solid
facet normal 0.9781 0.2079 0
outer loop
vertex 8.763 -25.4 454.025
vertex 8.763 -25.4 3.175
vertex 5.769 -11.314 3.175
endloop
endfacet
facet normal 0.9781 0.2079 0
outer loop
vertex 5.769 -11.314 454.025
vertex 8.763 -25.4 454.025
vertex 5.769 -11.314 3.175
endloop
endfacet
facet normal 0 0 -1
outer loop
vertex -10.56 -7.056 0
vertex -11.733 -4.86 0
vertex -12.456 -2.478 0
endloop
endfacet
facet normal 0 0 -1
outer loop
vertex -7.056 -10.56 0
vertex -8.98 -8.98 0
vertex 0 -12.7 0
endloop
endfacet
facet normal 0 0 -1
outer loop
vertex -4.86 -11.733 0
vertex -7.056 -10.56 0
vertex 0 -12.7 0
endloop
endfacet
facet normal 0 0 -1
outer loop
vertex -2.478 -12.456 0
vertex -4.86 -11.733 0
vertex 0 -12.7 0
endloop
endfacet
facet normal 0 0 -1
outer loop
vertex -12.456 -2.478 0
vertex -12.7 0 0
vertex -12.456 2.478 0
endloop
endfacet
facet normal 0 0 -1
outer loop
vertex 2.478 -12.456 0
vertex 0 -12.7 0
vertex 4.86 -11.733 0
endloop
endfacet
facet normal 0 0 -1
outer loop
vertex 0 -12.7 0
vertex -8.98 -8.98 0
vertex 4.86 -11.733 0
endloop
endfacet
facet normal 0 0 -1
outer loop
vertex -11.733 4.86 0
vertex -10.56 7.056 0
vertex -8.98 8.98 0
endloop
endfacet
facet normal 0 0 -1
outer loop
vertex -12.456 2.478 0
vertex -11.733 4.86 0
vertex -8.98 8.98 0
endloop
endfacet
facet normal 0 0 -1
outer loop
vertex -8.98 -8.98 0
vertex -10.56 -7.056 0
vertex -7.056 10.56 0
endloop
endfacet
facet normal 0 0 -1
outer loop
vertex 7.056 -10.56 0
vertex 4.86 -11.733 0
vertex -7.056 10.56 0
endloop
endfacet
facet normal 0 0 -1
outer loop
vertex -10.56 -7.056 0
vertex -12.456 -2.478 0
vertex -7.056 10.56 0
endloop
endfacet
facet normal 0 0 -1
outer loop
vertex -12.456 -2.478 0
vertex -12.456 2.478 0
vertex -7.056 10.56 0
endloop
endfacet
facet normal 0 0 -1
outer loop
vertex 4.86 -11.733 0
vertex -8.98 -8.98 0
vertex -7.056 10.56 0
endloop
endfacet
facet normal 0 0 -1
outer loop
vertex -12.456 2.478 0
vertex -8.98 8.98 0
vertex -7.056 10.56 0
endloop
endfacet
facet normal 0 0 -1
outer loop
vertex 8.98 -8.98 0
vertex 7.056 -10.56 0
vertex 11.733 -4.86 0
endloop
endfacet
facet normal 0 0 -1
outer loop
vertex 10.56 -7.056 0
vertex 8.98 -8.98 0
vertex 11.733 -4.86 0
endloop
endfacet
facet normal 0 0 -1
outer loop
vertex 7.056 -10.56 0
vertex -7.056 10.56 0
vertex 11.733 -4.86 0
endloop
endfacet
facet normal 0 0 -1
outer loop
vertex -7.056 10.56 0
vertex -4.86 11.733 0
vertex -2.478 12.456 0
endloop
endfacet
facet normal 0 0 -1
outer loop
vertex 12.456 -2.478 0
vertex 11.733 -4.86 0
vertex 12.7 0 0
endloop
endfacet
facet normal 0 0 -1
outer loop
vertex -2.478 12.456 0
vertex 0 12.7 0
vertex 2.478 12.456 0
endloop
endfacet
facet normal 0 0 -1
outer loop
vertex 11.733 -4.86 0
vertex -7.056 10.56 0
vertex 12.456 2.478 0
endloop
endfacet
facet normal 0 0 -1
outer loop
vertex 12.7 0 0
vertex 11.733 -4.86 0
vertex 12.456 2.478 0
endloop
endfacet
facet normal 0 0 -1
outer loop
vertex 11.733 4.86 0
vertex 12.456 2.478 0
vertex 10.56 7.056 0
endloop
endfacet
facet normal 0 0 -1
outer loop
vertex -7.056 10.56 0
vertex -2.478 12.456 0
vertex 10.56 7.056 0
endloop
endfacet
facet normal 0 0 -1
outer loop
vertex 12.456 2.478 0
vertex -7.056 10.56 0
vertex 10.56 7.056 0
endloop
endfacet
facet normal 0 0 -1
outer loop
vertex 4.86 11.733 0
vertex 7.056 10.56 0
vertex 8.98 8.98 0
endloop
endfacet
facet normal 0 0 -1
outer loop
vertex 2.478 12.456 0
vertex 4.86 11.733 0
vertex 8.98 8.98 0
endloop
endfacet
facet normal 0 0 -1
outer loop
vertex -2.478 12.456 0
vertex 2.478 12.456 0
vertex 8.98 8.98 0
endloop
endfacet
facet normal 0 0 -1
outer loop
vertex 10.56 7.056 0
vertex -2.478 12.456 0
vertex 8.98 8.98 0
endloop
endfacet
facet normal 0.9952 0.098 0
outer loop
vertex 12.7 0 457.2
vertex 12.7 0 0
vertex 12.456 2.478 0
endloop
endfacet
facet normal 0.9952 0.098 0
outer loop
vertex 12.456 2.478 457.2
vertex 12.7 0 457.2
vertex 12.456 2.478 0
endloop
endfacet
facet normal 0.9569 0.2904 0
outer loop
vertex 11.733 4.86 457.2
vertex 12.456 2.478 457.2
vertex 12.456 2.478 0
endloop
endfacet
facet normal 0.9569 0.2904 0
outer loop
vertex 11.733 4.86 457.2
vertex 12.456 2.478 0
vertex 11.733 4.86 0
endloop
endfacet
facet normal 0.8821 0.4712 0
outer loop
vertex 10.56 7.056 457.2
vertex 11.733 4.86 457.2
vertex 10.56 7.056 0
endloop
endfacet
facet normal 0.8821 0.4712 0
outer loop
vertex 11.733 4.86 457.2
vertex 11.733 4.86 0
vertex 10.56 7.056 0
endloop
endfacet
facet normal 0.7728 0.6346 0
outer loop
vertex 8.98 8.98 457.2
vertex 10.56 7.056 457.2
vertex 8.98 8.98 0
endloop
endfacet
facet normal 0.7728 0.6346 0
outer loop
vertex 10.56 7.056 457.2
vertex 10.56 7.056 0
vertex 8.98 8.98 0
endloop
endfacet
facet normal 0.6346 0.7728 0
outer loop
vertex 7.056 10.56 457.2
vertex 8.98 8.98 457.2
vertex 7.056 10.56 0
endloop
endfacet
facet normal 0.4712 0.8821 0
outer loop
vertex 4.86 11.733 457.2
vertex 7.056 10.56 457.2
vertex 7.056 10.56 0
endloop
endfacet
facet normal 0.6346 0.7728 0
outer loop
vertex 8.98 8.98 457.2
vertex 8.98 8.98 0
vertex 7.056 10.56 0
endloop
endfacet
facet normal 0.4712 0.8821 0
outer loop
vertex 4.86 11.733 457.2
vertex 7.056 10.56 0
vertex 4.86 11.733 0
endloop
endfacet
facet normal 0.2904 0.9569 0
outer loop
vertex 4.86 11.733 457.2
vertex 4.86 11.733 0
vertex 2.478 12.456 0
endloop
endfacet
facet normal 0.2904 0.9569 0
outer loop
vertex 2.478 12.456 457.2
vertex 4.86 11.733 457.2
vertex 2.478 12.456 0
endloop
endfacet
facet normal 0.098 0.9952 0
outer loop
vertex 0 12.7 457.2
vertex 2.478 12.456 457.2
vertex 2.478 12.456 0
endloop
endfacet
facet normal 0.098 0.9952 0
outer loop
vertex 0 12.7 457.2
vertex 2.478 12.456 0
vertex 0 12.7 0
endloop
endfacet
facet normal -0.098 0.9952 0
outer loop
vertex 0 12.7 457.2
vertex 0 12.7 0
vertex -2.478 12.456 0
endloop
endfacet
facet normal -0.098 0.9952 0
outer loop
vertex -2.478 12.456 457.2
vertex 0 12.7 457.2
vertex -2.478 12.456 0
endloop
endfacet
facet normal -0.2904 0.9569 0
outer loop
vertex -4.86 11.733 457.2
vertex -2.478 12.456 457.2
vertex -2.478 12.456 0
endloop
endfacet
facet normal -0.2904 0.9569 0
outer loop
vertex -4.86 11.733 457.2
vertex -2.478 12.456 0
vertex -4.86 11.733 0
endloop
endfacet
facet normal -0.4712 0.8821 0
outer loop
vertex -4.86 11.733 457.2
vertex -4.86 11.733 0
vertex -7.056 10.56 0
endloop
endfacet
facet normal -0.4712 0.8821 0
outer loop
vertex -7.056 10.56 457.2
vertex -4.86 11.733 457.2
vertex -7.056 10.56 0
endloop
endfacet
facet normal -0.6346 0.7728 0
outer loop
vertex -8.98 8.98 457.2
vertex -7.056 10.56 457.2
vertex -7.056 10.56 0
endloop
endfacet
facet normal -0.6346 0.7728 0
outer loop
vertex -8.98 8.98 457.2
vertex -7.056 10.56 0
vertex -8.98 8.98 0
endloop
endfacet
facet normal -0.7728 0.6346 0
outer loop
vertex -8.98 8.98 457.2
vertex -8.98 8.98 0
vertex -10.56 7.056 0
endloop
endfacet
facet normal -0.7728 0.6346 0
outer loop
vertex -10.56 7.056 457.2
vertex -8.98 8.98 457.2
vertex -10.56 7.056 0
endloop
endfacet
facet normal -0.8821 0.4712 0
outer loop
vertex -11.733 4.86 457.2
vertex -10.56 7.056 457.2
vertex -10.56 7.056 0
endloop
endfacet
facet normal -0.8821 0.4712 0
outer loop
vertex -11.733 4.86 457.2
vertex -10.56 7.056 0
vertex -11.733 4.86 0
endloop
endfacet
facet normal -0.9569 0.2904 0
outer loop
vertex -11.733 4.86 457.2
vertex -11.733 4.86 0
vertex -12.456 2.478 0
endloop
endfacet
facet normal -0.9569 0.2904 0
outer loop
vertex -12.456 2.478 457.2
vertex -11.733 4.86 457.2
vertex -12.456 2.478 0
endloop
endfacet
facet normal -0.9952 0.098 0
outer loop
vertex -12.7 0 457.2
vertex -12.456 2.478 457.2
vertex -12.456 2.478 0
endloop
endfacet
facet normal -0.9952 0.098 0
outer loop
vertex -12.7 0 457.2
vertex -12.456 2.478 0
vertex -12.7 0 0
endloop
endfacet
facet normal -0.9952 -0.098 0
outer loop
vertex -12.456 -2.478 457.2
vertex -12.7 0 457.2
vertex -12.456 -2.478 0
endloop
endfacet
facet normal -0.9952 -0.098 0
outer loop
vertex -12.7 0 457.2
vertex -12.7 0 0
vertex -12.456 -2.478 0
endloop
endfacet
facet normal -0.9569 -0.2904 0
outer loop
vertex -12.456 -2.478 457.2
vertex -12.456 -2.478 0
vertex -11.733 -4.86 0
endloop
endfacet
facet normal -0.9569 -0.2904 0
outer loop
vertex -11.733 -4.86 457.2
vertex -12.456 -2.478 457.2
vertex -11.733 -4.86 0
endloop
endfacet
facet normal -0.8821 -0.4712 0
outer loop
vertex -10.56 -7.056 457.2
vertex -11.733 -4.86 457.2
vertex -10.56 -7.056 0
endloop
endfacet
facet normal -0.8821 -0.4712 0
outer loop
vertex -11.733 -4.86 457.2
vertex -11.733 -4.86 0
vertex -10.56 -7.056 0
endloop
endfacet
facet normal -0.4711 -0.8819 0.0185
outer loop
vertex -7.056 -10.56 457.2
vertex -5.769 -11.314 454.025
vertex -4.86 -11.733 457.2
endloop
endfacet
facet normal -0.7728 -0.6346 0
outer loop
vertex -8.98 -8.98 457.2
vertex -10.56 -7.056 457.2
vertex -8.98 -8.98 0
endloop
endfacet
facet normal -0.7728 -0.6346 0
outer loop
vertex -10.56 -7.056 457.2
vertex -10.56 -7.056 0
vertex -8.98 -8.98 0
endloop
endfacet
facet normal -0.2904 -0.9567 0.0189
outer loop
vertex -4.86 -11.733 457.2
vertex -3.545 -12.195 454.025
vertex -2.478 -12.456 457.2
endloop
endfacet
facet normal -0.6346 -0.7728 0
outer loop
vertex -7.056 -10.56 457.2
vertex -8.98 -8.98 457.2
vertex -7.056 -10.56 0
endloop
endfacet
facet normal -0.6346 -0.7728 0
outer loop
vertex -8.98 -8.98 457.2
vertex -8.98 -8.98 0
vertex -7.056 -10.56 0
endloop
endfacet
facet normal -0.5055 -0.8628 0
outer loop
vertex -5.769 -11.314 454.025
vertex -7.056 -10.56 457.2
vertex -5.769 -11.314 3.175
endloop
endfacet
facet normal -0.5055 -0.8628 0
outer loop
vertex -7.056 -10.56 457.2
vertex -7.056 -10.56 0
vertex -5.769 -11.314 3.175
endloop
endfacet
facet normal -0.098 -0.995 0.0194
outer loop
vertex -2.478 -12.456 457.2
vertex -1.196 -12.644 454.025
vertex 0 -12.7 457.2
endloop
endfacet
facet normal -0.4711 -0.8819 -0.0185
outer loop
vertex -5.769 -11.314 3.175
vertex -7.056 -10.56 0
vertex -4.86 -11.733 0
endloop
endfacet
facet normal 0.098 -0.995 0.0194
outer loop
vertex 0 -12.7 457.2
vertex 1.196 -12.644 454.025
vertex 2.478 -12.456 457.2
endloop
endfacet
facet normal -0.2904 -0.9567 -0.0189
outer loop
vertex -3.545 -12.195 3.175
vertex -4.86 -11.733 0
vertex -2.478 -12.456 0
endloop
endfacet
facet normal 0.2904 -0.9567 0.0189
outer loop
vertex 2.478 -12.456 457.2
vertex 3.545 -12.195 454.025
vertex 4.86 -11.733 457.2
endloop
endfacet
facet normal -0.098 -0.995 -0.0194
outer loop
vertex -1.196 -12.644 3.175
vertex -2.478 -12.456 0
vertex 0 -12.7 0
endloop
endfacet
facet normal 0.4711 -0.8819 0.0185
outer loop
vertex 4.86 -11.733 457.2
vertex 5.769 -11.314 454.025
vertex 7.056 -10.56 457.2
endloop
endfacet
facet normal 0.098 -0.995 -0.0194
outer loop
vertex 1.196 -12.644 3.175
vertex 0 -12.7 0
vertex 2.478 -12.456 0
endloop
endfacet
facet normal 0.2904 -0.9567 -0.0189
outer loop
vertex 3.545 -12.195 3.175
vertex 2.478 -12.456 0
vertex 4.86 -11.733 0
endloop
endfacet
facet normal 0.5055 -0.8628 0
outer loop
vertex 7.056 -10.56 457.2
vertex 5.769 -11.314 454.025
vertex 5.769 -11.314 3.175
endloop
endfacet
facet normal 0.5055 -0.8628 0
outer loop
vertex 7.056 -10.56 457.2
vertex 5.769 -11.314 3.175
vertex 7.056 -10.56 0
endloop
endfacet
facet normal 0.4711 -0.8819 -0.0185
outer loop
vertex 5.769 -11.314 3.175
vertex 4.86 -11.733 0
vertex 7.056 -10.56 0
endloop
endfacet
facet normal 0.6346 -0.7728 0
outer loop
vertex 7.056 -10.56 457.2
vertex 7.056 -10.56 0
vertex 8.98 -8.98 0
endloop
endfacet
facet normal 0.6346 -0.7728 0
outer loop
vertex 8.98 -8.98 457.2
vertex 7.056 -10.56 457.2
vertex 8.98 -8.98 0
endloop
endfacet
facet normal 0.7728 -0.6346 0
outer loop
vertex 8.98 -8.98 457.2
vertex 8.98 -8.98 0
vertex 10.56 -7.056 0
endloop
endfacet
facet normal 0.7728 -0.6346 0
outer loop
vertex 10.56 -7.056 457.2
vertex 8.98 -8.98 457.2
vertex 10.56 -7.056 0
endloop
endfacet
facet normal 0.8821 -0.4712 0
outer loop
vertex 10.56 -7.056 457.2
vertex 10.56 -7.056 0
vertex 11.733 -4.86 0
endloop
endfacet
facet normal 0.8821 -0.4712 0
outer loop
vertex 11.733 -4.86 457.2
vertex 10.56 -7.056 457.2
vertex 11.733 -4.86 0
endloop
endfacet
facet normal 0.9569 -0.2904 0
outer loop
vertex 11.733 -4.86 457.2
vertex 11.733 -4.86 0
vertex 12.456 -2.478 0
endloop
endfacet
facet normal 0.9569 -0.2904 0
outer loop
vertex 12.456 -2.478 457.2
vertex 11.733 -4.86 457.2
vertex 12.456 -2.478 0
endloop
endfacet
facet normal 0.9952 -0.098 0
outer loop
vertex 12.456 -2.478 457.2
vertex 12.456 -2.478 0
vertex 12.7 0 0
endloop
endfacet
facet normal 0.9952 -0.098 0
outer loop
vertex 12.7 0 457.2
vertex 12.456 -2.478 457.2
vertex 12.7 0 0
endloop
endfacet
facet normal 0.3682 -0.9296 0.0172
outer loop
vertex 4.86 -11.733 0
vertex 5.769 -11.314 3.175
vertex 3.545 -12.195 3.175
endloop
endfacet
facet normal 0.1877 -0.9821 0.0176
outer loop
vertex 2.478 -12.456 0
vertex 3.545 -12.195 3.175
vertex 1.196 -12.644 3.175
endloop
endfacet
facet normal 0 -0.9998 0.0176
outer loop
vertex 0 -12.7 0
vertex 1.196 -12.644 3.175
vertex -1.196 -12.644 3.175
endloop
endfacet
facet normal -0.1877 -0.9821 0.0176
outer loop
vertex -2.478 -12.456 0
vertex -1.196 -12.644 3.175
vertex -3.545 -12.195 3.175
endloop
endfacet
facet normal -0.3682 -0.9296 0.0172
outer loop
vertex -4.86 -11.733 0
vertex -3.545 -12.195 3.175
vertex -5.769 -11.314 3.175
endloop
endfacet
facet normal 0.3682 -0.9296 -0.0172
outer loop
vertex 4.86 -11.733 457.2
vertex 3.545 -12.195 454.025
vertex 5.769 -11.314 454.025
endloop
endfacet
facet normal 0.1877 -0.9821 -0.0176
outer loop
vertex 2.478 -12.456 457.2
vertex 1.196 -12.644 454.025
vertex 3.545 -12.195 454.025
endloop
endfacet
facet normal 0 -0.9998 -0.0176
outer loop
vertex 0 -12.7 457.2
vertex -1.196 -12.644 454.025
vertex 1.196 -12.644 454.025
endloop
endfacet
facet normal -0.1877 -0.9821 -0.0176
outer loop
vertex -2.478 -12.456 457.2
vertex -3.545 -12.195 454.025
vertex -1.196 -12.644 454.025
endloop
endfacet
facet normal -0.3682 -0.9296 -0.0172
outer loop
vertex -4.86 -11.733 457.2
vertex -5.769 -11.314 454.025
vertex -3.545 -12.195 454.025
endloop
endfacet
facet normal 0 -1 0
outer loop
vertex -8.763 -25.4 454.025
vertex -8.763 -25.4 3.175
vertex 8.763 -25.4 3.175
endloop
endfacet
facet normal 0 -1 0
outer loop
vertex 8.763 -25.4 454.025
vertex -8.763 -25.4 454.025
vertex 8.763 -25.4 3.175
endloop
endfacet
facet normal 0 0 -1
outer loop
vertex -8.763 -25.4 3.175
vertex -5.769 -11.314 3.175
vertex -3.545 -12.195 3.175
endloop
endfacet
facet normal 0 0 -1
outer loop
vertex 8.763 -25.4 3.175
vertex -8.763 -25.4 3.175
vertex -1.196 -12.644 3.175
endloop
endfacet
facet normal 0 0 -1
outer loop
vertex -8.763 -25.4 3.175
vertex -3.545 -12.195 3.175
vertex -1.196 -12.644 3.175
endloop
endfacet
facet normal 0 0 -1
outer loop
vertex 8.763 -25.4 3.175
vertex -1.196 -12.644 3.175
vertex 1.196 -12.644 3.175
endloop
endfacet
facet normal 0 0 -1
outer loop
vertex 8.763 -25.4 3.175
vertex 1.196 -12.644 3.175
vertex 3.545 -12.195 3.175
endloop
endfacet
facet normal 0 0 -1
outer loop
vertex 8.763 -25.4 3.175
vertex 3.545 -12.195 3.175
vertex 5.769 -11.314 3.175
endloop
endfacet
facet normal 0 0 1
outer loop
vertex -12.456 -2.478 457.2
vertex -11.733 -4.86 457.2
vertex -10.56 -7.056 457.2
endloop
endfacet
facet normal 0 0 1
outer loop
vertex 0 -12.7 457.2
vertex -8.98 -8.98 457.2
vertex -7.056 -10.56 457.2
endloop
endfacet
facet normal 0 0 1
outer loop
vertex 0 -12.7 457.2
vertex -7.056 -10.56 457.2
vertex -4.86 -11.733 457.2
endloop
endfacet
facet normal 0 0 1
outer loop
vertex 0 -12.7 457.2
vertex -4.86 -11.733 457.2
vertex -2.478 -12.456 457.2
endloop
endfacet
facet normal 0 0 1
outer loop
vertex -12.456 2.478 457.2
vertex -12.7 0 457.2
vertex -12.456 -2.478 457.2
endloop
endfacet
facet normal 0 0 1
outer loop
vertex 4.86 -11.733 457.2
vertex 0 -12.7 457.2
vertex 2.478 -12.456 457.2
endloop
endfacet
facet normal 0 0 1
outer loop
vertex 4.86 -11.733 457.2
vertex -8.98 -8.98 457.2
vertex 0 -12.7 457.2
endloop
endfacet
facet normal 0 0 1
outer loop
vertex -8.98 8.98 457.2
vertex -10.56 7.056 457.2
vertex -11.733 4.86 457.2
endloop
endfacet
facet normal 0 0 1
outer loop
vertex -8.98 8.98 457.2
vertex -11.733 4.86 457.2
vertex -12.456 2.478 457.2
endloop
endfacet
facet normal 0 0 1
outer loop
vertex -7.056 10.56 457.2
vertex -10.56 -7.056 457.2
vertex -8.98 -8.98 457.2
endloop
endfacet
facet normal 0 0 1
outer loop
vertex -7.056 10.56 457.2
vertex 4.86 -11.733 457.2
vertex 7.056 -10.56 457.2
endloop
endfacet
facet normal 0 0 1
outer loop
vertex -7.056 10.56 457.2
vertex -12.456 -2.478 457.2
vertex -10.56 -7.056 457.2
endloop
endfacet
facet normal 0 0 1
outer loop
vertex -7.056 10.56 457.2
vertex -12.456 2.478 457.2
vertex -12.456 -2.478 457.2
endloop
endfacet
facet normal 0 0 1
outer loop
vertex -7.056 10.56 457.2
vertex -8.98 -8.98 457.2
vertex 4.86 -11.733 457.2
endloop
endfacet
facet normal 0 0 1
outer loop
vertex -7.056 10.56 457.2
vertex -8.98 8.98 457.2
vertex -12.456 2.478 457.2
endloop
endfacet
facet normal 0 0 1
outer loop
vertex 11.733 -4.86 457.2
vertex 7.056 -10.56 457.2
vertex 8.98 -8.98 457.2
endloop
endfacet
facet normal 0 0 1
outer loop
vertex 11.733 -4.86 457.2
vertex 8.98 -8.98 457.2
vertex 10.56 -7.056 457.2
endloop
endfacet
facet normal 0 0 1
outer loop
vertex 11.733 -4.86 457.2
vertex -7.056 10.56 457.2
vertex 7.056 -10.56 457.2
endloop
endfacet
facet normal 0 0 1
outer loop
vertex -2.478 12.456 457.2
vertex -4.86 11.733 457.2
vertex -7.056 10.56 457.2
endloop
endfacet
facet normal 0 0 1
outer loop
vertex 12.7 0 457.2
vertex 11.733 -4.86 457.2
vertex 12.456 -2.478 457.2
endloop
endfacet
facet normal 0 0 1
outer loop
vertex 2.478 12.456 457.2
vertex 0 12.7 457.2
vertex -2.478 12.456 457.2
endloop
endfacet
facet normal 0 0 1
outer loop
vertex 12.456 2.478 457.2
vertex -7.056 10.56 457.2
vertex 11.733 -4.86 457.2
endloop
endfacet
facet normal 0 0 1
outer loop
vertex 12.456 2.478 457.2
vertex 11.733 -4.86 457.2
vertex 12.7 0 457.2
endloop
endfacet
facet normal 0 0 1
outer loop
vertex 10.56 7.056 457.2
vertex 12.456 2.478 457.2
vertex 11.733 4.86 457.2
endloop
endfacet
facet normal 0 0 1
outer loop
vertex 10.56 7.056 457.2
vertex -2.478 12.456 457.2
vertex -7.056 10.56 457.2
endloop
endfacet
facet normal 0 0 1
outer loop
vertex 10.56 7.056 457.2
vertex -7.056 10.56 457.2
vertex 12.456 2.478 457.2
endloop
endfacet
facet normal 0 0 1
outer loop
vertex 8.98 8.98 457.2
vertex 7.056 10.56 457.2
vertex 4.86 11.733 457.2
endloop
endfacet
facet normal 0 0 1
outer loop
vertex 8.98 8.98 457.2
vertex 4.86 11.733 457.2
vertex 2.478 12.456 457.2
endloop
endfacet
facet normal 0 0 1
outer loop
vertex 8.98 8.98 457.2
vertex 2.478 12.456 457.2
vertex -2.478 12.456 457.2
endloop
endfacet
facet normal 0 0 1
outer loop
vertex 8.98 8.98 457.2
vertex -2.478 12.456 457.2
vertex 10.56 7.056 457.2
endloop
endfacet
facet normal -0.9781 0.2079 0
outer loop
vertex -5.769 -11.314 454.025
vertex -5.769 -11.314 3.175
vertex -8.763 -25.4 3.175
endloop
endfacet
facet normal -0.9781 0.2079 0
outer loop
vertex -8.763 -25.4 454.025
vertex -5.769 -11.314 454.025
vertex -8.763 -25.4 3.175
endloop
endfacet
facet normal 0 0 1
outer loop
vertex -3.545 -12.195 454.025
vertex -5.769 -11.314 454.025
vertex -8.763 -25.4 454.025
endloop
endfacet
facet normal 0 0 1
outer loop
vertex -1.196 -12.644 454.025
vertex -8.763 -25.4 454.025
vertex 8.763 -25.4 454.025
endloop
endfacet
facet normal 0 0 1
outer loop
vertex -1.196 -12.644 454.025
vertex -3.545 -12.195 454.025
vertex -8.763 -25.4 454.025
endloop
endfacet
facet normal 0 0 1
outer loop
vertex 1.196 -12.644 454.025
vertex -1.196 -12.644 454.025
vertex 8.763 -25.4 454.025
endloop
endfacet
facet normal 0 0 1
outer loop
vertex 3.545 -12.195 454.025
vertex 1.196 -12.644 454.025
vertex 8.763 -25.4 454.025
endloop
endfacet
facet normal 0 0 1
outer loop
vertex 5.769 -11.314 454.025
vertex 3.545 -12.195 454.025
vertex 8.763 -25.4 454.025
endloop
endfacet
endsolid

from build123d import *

# Parameters (mm, degrees)
SKETCH1_R           = 12.7
BASE_EXTRUDE_DEPTH  = 457.2
BOSS_EXTRUDE1_DEPTH = 450.85


with BuildPart() as part:
    # Sketch1 → Base-Extrude (new body)
    with BuildSketch(Plane.XY):
        Circle(SKETCH1_R)
    extrude(amount=BASE_EXTRUDE_DEPTH)

    # Sketch2 → Boss-Extrude1 (add)
    with BuildSketch(Plane.XY.offset(3.175)):
        with BuildLine():
            Line((-8.763, -25.4), (8.763, -25.4))
            Line((8.763, -25.4), (5.7689526, -11.314114455))
            ThreePointArc((5.7689526, -11.314114455), (0, -12.7), (-5.7689526, -11.314114455))
            Line((-5.7689526, -11.314114455), (-8.763, -25.4))
        make_face()
    extrude(amount=BOSS_EXTRUDE1_DEPTH)


solid = part.part
